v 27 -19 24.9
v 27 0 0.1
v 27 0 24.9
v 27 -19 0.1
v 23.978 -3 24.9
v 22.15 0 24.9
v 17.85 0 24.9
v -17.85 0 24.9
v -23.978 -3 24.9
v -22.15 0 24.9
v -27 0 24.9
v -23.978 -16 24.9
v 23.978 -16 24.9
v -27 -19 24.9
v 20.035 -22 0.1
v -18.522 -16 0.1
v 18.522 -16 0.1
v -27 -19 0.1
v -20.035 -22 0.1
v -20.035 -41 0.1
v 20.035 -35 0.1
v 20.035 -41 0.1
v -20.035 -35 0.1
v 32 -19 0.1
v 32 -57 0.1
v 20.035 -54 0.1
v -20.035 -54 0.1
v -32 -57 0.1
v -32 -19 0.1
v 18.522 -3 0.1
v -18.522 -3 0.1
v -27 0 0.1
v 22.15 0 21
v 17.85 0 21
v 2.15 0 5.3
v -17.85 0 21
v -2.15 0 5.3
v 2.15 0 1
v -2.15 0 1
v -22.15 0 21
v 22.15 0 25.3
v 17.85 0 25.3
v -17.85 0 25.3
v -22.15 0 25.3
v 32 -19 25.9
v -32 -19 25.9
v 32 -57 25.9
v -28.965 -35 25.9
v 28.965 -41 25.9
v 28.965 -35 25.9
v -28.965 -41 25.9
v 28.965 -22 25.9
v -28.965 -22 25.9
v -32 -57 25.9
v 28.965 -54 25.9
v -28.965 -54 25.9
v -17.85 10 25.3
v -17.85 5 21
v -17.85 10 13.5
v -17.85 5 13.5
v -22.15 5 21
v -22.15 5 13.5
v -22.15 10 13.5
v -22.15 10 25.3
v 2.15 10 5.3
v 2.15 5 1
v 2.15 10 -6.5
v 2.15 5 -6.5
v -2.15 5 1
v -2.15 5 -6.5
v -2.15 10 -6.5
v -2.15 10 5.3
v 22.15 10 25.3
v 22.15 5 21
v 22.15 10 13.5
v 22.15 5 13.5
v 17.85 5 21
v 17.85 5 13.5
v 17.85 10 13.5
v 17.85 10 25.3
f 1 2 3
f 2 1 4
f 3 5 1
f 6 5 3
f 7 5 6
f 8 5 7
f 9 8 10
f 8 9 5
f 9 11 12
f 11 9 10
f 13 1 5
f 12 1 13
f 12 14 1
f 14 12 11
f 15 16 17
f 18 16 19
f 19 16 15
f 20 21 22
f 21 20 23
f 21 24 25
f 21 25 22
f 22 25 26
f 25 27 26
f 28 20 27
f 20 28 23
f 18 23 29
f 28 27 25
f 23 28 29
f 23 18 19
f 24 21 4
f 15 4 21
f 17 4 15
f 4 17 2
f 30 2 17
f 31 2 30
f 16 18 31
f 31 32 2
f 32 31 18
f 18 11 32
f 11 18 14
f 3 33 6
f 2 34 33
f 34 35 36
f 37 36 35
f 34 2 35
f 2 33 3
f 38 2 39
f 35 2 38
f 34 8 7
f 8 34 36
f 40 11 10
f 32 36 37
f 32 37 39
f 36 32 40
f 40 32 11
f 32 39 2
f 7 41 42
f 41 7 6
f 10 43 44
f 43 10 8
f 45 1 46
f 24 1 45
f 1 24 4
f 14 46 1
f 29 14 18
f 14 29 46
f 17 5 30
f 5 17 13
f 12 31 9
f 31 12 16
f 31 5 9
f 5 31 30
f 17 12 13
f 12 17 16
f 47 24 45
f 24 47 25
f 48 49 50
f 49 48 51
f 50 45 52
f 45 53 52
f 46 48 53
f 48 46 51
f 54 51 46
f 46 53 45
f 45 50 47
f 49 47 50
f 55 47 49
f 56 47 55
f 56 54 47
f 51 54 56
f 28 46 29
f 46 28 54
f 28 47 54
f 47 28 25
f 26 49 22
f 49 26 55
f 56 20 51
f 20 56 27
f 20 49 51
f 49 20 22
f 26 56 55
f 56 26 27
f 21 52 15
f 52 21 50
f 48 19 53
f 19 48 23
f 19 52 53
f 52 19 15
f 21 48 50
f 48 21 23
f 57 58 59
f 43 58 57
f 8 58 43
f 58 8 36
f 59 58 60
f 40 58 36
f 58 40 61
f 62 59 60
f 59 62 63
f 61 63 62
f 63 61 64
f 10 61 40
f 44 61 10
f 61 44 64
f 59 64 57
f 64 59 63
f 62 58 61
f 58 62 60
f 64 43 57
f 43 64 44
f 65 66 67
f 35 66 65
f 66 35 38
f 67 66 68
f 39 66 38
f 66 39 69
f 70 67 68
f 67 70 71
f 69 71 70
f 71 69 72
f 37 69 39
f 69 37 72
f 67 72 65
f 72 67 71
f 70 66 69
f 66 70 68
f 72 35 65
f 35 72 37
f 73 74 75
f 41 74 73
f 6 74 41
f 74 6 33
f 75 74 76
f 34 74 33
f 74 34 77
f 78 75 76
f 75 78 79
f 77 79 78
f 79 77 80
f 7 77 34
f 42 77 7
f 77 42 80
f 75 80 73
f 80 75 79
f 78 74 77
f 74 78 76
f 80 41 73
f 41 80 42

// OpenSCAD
// file: ../../modules/skadis.scad
ikea_skadis_hole_w = 4.3;
ikea_skadis_hook_depth = 5;
ikea_skadis_hole_h = 7.5;
ikea_skadis_holes_dist = 80;
ikea_skadis_holes_horiz_dist = 40;

module skadis_hook() {
    color("green")
    translate([0,ikea_skadis_hook_depth,-ikea_skadis_hole_h]) cube([ikea_skadis_hole_w,ikea_skadis_hook_depth,ikea_skadis_hole_h ]);

    color("violet")
    translate([0,0,0]) cube([ikea_skadis_hole_w,ikea_skadis_hook_depth*2,ikea_skadis_hole_w ]);
}

module skadis_double_hooks() {
    skadis_hook();
    
    translate([0,0,ikea_skadis_holes_dist]) skadis_hook();
    
    color("yellow")
    translate([0,-ikea_skadis_hook_depth,0])
    cube([ikea_skadis_hole_w,ikea_skadis_hook_depth,ikea_skadis_holes_dist + ikea_skadis_hole_w]);
}

module skadis_triple_horiz_hooks() {
    translate([-20 - ikea_skadis_hole_w / 2,0,0]) union() {
        skadis_hook();
        translate([20,0,-20]) skadis_hook();
        translate([40,0,0]) skadis_hook();
    }
}

//skadis_double_hooks();
//skadis_triple_horiz_hooks();
// main file
include <../../modules/skadis.scad>;

mini_claw_d = 13;
mini_claw_h = 26;
mini_claw_w_1 = 58;
mini_claw_w_2 = 40;

maxi_claw_d = 13;
maxi_claw_h = 25;
maxi_claw_w_1 = 48;
maxi_claw_w_2 = 37;


delta = 3;
cut = 0.1;

translate([0,-delta ,0])
difference() {
    translate([-(maxi_claw_w_1 + delta * 2)/2, - maxi_claw_d - delta , cut]) cube([maxi_claw_w_1 + delta * 2, maxi_claw_d + delta * 2, maxi_claw_h - cut * 2]);

    translate([0,-maxi_claw_d,maxi_claw_h]) rotate([-90, 0,0])
linear_extrude(height = maxi_claw_d) {
    polygon(points = [[-maxi_claw_w_1/2, 0], [-maxi_claw_w_2/2, maxi_claw_h], [maxi_claw_w_2/2, maxi_claw_h],  [maxi_claw_w_1/2, 0]]);
    }
}

translate([0,-delta - mini_claw_d - delta * 2 - maxi_claw_d - delta * 2 ,0])
difference() {
    translate([-(mini_claw_w_1 + delta * 2)/2, - mini_claw_d - delta , cut]) cube([mini_claw_w_1 + delta * 2, mini_claw_d + delta * 2, mini_claw_h - cut * 2]);

    translate([0,-mini_claw_d,mini_claw_h]) rotate([-90, 0,0])
linear_extrude(height = mini_claw_d) {
    polygon(points = [[-mini_claw_w_1/2, 0], [-mini_claw_w_2/2, mini_claw_h], [mini_claw_w_2/2, mini_claw_h],  [mini_claw_w_1/2, 0]]);
    }
}

translate([0,-delta - maxi_claw_d - delta * 2,0])
difference() {
    translate([-(mini_claw_w_1 + delta * 2)/2, - mini_claw_d - delta , cut]) cube([mini_claw_w_1 + delta * 2, mini_claw_d + delta * 2, mini_claw_h - cut * 2]);

    translate([0,-mini_claw_d,mini_claw_h]) rotate([-90, 0,0])
linear_extrude(height = mini_claw_d) {
    polygon(points = [[-mini_claw_w_1/2, 0], [-mini_claw_w_2/2, mini_claw_h], [mini_claw_w_2/2, mini_claw_h],  [mini_claw_w_1/2, 0]]);
    }
}

translate([0,0,mini_claw_h - 5]) skadis_triple_horiz_hooks();
